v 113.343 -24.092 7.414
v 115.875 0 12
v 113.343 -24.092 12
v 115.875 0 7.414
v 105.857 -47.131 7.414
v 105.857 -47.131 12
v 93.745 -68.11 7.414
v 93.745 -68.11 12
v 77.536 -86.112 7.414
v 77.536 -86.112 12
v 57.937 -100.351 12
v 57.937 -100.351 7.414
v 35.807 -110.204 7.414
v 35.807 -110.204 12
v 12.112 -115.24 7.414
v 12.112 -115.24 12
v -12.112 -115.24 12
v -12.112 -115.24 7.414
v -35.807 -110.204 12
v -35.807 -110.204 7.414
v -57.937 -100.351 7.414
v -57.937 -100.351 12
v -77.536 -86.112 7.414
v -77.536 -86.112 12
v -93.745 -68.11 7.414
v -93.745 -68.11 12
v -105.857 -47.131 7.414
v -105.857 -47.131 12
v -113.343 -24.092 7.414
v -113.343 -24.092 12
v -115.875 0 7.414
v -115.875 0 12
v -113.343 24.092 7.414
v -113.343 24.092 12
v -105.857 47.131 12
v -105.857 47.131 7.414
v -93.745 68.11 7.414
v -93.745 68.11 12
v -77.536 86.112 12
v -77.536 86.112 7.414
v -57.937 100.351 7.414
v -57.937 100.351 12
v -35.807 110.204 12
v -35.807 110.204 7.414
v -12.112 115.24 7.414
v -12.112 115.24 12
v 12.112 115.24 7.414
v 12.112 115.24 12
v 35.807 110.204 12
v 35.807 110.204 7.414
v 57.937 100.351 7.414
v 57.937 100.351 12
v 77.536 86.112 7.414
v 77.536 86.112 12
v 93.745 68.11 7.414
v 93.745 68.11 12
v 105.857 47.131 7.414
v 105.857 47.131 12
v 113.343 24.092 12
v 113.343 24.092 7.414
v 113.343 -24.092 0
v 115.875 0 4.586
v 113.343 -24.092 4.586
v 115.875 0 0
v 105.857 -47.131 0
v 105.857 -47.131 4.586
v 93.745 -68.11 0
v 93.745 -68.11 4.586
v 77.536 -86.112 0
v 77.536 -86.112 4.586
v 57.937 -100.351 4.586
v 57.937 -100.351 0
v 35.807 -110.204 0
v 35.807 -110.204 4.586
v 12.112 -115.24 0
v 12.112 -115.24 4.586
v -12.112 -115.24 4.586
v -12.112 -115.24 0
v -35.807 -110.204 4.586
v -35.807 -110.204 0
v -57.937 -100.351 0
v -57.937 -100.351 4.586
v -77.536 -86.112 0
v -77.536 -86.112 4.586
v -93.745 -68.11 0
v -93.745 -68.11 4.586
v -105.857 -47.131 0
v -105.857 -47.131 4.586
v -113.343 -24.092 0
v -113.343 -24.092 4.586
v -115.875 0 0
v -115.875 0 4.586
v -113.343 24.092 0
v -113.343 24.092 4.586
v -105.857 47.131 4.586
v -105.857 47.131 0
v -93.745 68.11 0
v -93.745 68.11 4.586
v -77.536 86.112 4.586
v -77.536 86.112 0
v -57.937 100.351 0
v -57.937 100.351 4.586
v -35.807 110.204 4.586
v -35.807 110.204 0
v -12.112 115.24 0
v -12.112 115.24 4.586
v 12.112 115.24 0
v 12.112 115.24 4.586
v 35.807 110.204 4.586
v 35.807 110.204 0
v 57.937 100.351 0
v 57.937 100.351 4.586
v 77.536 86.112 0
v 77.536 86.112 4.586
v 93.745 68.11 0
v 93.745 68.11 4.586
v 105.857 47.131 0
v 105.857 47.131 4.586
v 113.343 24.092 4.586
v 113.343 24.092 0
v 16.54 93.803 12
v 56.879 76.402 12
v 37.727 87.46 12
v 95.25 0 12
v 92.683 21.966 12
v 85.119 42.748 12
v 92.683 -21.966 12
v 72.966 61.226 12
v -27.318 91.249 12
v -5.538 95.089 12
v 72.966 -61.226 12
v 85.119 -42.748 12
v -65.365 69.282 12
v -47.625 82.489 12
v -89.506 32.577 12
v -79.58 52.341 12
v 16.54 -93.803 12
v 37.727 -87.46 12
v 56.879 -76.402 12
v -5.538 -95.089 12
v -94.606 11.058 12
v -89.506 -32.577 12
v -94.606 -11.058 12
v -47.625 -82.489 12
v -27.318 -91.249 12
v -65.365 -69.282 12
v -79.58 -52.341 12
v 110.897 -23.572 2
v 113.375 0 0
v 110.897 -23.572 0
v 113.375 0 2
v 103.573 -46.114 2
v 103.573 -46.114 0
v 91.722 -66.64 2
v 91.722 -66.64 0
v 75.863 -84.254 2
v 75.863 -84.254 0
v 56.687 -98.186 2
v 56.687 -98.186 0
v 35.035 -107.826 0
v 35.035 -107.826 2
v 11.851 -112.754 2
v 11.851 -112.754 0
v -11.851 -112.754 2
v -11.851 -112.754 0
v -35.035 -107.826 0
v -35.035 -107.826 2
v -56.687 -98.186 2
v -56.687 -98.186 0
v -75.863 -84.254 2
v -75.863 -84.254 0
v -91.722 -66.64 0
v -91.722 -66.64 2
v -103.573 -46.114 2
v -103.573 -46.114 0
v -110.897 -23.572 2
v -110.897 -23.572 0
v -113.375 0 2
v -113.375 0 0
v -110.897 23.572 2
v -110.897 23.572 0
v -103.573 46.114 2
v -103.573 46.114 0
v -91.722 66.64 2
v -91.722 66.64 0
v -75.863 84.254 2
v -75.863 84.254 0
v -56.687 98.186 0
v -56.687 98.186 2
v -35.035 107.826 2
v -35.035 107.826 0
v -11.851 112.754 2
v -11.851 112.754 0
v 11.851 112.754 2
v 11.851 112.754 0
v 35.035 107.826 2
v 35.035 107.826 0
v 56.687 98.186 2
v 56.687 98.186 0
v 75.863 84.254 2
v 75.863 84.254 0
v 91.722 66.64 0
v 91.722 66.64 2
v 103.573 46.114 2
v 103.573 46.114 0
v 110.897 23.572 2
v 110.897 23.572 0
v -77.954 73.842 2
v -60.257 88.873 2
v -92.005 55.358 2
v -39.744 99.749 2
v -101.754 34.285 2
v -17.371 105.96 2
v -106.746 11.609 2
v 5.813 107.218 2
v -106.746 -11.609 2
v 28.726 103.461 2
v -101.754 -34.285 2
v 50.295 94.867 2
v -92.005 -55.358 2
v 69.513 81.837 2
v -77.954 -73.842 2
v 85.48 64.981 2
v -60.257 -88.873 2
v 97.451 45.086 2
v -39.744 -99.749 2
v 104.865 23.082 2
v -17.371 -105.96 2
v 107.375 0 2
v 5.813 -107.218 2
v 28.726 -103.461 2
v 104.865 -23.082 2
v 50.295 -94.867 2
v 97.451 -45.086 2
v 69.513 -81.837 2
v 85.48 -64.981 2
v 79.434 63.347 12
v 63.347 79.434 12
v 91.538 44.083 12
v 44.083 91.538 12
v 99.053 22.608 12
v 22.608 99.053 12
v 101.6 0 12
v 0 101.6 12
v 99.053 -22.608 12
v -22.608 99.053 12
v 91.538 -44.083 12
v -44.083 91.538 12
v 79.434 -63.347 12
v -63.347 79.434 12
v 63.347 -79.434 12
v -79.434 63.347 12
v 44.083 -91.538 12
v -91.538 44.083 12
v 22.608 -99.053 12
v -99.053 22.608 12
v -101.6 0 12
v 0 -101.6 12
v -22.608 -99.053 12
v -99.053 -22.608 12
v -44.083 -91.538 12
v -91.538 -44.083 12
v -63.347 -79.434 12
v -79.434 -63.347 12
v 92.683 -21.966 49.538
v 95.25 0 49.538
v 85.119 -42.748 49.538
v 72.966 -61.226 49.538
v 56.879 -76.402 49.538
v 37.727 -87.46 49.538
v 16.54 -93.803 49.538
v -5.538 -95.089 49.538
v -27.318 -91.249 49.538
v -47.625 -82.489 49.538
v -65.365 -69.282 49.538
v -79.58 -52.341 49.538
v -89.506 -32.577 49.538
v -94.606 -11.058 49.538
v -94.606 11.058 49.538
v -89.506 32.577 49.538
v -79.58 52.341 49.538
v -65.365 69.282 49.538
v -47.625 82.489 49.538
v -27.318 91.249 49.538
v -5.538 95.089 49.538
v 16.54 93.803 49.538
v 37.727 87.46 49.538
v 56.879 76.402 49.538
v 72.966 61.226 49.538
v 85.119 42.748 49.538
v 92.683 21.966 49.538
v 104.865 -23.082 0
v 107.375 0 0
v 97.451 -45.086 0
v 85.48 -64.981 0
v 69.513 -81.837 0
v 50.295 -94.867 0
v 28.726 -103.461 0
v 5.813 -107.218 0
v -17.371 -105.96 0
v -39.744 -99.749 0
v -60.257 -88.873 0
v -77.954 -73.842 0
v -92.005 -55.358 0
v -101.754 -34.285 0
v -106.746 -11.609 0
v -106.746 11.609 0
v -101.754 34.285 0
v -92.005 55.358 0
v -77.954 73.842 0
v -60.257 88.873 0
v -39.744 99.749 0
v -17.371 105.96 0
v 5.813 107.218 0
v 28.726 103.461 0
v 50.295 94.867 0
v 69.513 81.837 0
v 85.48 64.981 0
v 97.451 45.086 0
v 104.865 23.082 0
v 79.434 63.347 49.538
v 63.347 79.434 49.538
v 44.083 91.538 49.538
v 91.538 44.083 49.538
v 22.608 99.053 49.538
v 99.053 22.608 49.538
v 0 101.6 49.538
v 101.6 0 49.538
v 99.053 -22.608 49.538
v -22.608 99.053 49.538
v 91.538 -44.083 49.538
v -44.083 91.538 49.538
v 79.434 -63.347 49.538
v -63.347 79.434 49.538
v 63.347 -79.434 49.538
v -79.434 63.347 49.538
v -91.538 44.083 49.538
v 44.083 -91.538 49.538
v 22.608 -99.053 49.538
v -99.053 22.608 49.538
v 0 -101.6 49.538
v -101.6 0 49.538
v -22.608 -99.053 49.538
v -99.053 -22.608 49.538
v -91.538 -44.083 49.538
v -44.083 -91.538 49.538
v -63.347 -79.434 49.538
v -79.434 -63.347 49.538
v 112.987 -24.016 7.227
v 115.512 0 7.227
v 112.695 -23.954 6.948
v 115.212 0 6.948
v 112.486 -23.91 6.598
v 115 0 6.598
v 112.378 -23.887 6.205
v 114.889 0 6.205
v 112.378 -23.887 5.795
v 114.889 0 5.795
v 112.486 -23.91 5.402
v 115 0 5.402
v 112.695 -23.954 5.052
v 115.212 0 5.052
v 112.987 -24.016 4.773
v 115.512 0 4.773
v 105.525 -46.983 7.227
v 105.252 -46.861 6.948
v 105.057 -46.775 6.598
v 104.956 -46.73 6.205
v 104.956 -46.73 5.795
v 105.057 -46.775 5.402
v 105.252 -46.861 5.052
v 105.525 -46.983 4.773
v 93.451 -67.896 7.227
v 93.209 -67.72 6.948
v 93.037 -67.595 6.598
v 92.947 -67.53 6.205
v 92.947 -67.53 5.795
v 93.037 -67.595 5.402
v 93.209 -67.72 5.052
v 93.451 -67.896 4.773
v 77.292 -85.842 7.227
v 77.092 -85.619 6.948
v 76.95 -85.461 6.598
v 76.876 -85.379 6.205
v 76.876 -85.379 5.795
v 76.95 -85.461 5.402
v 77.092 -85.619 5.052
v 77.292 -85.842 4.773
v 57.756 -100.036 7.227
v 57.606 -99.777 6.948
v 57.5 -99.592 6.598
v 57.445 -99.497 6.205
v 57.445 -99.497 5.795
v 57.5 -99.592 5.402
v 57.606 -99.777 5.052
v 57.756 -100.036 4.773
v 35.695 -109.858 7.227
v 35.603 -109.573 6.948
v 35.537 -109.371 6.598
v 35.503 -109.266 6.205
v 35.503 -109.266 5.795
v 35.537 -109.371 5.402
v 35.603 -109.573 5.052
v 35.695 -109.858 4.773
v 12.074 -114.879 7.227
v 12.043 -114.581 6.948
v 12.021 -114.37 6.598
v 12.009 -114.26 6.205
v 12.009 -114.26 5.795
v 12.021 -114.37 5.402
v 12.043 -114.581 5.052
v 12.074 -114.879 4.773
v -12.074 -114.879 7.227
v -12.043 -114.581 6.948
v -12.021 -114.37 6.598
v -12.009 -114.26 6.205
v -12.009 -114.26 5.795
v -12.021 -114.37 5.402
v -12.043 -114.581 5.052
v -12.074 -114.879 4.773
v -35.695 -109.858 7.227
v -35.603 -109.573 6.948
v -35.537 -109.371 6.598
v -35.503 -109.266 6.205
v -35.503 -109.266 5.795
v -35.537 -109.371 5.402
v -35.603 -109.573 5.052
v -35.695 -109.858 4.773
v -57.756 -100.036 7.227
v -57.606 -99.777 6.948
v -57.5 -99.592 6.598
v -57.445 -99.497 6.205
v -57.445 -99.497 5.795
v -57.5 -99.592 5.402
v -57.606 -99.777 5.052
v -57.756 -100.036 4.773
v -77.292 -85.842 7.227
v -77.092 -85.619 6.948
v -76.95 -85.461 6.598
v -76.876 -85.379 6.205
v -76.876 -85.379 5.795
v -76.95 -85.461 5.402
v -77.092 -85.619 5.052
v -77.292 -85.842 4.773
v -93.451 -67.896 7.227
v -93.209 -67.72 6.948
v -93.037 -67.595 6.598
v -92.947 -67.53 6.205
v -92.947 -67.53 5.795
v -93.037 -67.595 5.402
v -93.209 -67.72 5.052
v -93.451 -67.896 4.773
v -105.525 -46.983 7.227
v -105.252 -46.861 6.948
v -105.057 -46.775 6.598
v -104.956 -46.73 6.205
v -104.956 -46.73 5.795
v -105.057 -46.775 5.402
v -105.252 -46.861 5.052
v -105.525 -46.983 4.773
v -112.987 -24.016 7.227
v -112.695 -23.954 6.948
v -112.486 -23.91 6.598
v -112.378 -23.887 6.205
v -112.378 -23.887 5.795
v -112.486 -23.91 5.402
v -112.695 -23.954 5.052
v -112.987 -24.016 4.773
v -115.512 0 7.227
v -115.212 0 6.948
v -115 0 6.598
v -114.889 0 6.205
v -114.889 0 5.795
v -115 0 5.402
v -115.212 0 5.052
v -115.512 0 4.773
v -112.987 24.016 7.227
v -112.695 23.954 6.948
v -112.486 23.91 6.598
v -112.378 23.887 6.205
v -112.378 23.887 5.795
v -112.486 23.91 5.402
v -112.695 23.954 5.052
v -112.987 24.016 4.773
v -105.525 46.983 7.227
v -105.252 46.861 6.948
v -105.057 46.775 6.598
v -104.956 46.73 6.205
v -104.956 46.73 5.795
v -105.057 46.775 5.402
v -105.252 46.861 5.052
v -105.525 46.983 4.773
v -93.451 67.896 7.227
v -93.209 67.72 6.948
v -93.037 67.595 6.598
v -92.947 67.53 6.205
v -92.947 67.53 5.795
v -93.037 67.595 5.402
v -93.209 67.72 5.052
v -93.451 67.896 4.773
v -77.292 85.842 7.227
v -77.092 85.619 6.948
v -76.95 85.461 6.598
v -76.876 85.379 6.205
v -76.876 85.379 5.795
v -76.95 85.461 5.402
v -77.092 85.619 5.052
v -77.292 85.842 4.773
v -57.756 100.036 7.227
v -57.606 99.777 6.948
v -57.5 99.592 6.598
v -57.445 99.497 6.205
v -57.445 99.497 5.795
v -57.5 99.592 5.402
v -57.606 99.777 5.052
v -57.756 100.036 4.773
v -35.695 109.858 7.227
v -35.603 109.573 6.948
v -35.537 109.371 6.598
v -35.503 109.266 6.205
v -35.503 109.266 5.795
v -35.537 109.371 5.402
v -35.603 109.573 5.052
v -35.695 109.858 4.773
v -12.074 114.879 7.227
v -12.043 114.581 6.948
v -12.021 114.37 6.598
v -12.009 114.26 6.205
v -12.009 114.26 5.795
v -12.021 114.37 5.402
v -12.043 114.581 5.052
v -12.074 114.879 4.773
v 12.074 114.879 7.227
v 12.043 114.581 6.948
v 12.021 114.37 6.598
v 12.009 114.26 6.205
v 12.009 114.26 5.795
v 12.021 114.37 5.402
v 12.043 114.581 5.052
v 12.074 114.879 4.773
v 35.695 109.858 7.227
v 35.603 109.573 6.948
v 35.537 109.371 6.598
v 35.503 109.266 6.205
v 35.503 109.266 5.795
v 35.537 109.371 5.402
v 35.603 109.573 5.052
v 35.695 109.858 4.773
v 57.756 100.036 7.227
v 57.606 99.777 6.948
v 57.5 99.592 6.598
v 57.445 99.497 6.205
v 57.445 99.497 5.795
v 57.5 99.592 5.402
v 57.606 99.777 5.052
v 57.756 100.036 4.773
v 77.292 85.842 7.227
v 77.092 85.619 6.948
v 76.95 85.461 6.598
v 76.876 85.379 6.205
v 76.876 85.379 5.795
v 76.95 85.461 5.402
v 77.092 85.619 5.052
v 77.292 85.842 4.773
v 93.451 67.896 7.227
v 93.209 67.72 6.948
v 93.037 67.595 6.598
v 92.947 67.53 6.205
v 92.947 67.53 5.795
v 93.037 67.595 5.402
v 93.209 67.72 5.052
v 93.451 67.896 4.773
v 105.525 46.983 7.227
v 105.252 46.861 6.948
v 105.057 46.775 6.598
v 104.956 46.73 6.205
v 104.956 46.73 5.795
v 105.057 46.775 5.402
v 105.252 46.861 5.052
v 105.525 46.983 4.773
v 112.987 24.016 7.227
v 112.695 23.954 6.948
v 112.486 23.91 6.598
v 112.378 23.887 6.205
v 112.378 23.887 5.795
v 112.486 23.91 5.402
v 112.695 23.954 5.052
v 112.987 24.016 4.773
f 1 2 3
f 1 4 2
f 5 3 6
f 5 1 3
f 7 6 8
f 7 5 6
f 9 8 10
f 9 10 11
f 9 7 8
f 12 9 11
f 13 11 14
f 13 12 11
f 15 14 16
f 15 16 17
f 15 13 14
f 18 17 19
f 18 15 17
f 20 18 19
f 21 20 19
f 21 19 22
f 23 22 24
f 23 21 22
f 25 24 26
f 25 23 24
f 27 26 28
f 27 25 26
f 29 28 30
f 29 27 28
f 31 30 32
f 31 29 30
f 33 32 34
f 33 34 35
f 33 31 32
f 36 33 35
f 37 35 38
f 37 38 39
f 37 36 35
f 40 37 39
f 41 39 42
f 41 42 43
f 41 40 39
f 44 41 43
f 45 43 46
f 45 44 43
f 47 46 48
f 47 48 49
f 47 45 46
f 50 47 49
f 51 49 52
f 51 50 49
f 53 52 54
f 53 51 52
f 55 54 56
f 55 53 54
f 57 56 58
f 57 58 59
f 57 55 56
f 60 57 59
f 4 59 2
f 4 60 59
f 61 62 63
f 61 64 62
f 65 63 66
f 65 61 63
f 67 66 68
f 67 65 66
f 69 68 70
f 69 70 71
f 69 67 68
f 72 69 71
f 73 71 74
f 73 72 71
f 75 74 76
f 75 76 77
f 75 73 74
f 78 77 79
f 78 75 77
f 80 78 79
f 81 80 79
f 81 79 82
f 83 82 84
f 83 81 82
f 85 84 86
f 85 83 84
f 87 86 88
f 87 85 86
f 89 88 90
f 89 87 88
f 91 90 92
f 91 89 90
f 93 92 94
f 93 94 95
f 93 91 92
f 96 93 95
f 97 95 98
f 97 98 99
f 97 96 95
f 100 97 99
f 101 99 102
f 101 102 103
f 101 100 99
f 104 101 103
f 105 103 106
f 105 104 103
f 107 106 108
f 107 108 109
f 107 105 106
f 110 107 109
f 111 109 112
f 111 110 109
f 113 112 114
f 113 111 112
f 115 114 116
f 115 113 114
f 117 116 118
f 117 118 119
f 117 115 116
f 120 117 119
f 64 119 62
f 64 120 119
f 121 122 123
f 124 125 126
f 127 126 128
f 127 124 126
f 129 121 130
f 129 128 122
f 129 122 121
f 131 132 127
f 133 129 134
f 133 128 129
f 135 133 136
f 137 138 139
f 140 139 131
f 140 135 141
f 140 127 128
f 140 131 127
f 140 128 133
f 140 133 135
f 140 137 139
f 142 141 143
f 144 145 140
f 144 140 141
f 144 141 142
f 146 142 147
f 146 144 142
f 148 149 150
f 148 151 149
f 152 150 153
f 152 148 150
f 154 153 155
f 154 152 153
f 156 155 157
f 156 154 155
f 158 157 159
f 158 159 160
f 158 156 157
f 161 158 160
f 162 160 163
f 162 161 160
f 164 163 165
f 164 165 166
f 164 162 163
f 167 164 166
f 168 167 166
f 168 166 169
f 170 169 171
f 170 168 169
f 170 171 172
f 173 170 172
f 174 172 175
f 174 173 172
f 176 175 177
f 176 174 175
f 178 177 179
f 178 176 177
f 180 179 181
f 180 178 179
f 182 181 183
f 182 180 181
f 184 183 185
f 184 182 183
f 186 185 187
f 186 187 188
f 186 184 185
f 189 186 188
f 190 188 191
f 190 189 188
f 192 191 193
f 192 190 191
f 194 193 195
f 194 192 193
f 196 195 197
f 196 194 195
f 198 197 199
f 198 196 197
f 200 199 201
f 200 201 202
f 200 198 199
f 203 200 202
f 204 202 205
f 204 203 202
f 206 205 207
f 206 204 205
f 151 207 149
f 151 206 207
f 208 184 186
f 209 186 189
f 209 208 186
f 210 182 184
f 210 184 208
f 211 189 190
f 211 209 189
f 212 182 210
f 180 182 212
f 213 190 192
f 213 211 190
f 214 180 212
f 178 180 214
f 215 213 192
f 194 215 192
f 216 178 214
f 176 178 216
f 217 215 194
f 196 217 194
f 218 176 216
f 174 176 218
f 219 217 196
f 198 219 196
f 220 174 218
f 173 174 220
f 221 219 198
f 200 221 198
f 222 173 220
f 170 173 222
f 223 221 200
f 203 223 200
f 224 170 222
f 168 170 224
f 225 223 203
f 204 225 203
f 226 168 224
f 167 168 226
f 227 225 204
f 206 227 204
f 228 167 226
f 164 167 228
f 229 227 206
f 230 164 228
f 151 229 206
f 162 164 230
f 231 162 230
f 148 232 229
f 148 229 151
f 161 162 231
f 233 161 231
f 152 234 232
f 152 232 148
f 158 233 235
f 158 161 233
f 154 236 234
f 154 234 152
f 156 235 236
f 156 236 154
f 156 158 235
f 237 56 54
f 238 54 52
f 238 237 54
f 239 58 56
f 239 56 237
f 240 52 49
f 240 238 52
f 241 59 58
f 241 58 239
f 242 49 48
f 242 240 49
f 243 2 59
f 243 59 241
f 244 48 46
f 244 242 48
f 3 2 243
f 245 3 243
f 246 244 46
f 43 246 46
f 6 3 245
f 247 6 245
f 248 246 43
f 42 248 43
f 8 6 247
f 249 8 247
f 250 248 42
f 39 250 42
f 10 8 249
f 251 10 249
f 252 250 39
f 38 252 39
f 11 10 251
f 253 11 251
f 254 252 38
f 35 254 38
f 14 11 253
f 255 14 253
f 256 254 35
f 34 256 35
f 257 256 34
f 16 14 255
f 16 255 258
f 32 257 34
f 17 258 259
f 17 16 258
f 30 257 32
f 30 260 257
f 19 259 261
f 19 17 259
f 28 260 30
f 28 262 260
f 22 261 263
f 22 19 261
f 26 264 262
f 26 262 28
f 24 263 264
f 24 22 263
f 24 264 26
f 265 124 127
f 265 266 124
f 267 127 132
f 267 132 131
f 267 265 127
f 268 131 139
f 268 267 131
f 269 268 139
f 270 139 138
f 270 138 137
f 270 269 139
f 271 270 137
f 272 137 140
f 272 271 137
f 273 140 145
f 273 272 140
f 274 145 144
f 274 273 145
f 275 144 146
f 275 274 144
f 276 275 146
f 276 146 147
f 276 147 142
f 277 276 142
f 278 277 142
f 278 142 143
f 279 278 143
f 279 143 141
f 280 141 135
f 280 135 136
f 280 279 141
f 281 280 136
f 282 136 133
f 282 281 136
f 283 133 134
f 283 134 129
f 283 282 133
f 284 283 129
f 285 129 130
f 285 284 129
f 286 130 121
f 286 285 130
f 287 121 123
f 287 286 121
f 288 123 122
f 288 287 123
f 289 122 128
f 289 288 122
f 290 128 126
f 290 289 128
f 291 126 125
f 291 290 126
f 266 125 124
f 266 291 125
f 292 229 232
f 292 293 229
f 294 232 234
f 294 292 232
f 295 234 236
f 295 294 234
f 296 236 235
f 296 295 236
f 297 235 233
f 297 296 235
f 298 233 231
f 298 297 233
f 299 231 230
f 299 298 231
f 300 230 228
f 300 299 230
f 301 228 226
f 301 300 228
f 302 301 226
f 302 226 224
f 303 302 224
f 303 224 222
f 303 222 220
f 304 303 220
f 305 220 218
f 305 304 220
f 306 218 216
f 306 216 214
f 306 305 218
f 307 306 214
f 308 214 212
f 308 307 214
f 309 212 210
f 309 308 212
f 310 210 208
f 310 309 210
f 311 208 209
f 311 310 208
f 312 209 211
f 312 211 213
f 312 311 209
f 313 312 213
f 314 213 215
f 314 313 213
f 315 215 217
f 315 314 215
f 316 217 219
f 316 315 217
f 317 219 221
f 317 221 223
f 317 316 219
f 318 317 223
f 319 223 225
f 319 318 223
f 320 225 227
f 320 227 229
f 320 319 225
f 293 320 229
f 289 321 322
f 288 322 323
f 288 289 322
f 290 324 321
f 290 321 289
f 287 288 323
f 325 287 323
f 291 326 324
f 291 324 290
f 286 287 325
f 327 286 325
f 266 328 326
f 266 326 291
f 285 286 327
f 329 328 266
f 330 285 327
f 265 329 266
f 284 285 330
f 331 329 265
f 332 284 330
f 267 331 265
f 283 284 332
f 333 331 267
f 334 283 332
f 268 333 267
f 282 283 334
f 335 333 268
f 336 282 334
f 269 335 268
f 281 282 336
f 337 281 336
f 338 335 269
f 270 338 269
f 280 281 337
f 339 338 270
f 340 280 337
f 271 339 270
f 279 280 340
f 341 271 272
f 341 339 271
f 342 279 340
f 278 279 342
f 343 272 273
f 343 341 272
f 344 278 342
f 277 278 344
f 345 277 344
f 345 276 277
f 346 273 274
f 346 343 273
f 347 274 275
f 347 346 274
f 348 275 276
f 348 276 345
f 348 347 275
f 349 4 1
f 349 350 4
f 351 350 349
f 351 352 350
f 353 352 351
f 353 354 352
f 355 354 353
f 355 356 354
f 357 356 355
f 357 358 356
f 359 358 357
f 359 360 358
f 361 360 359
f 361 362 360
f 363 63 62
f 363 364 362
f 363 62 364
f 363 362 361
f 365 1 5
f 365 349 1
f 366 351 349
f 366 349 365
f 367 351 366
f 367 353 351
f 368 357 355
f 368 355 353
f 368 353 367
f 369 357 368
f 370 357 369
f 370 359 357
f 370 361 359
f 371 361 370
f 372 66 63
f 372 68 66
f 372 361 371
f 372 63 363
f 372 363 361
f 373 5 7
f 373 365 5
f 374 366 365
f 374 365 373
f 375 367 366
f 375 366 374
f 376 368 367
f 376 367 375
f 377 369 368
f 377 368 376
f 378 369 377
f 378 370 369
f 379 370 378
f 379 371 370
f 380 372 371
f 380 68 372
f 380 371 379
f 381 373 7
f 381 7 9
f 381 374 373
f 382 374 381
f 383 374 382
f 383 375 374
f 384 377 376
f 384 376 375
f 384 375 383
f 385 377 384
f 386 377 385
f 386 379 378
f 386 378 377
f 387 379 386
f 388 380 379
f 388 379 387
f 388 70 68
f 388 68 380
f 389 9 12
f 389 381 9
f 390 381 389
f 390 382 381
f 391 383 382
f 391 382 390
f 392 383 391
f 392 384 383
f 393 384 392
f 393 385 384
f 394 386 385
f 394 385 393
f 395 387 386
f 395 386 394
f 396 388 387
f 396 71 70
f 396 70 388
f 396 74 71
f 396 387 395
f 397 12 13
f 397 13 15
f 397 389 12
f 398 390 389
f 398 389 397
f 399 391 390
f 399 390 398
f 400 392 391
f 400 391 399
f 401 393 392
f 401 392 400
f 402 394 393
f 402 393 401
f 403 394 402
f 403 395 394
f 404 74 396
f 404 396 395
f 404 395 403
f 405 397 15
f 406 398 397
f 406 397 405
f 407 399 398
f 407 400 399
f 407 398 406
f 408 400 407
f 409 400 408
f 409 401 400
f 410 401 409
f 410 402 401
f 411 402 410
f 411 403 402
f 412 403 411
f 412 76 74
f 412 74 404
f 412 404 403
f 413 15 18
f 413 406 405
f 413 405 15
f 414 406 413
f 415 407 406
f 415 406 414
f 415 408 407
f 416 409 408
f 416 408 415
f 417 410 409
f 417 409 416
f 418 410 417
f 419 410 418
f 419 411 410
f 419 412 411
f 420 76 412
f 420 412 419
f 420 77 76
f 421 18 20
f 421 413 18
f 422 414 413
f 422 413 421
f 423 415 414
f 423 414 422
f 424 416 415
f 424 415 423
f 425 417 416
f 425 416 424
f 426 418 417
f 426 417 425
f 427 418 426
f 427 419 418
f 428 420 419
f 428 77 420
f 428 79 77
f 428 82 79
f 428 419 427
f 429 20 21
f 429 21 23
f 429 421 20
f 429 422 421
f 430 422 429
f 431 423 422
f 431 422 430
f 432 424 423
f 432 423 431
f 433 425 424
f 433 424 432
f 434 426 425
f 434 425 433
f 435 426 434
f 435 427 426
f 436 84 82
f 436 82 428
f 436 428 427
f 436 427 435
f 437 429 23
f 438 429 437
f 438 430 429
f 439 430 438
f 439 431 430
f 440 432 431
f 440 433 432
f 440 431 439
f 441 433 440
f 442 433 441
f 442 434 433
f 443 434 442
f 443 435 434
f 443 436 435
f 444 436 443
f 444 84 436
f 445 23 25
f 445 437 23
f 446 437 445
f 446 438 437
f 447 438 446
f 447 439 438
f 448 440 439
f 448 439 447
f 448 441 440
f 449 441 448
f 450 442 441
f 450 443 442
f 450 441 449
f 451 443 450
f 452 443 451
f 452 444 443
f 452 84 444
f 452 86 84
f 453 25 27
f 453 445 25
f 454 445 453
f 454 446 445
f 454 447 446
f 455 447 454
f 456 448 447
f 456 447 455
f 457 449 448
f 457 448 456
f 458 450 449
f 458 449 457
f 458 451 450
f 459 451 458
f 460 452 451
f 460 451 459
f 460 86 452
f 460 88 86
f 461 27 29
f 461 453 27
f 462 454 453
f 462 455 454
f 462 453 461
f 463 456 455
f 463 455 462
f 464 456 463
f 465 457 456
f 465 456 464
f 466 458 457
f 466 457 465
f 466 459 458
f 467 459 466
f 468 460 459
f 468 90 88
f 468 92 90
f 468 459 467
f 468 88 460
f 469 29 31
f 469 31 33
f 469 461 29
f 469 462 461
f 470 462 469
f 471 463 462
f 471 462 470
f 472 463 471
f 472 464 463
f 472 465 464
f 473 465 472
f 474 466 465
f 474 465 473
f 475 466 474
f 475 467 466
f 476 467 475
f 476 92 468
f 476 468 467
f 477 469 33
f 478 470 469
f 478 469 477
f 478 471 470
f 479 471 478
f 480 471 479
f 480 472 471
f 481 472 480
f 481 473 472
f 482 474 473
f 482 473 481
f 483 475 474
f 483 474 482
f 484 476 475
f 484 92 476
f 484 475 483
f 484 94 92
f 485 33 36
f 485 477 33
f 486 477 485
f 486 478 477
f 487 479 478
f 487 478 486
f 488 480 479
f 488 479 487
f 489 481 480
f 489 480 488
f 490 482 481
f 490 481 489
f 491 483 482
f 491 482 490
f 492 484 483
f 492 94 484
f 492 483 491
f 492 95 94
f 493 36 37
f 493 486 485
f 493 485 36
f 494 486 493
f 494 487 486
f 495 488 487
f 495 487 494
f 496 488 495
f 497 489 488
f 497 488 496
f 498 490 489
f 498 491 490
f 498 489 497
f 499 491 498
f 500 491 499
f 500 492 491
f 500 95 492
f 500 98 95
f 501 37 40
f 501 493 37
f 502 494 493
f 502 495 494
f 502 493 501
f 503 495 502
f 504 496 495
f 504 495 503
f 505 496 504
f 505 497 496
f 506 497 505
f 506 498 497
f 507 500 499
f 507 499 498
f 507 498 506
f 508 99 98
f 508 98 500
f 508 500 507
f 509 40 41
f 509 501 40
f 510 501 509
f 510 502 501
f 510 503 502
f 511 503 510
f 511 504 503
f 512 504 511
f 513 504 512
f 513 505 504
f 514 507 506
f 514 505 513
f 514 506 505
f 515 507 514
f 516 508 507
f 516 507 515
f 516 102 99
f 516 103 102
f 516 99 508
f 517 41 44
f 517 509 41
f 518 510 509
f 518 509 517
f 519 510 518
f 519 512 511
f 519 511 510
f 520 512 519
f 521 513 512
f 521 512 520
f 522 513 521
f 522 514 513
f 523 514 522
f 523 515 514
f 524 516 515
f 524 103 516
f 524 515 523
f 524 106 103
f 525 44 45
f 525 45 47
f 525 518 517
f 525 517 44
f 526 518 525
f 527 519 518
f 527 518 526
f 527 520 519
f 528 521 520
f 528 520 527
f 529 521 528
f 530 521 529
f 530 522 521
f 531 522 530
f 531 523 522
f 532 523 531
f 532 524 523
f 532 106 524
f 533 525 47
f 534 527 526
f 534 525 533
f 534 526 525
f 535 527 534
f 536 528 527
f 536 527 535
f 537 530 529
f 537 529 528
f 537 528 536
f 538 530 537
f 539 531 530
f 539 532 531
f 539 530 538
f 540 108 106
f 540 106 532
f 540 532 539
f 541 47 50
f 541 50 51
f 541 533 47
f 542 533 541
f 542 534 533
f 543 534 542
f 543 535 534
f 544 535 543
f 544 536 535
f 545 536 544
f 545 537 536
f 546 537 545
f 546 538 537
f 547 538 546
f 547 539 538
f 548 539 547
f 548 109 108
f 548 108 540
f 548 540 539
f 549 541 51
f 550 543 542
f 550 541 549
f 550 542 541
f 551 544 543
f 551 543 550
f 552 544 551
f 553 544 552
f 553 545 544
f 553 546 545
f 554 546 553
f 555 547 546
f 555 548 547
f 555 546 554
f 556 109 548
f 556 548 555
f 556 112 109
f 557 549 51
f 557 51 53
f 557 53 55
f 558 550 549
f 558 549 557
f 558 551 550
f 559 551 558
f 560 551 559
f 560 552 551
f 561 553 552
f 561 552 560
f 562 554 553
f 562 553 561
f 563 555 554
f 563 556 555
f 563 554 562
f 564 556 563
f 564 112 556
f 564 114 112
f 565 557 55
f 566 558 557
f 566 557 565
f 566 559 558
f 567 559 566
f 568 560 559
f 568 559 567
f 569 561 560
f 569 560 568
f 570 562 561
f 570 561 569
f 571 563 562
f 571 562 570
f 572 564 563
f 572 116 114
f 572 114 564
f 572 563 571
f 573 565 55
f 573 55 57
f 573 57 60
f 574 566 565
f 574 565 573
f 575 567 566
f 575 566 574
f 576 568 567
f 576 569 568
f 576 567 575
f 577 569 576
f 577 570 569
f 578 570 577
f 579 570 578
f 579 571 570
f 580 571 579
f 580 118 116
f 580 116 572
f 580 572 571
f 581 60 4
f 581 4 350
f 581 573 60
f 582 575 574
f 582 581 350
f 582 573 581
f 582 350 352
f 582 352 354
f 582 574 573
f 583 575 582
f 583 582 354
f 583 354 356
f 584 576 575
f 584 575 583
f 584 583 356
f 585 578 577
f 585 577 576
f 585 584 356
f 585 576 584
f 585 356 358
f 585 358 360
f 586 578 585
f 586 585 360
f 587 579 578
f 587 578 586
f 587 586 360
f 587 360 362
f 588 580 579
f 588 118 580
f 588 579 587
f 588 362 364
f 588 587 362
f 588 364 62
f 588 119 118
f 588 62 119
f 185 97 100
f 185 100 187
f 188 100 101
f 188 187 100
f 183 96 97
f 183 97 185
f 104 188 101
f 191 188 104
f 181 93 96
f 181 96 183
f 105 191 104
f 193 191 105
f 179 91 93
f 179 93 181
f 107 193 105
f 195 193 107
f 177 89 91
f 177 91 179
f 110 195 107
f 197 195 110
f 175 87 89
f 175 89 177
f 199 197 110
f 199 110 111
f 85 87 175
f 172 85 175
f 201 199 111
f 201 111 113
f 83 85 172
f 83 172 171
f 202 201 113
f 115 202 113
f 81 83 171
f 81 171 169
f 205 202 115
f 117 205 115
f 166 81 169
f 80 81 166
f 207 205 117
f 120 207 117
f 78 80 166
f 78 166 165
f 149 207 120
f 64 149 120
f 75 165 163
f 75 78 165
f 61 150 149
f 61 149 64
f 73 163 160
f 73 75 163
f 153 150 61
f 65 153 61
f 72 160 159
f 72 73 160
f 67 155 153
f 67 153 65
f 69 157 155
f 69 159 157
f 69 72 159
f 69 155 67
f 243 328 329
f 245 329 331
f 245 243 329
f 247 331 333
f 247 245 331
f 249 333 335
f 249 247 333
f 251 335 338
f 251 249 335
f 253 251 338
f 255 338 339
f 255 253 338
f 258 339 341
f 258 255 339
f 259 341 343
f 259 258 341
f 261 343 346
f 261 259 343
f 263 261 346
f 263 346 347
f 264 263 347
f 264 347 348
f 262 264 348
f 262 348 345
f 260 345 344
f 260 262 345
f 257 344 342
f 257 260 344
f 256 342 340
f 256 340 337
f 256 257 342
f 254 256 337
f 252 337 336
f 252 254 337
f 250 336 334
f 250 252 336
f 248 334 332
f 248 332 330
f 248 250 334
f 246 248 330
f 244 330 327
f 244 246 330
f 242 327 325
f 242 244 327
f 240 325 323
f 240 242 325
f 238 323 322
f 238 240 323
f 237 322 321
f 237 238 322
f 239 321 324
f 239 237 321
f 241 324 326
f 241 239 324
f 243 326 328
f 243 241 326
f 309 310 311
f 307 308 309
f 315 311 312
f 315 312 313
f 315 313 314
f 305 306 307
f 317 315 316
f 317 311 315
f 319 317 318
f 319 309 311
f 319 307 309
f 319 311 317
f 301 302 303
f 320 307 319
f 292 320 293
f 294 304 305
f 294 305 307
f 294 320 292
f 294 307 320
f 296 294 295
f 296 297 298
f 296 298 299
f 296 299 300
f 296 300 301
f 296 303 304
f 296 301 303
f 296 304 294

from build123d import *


with BuildPart() as part:
    # Sketch1 → Base-Revolve (revolve)
    with BuildSketch(Plane(origin=(0, 0, 0), x_dir=(0, 0, -1), z_dir=(1, 0, 0))):
        with BuildLine():
            Line((-4.585786438, 115.874999992), (0, 115.874999992))
            Line((0, 115.874999992), (0, 113.374999974))
            Line((0, 113.374999974), (-2, 113.374999974))
            Line((-2, 113.374999974), (-2, 107.374999974))
            Line((-2, 107.374999974), (0, 107.374999974))
            Line((0, 107.374999974), (0, 0))
            Line((0, 0), (-12, 0))
            Line((-12, 0), (-12, 95.25))
            Line((-12, 95.25), (-49.538490201, 95.25))
            Line((-49.538490201, 95.25), (-49.538490201, 101.6))
            Line((-49.538490201, 101.6), (-12, 101.6))
            Line((-12, 101.6), (-12, 115.874999992))
            Line((-12, 115.874999992), (-7.414213562, 115.874999992))
            ThreePointArc((-7.414213562, 115.874999992), (-6, 114.874999992), (-4.585786438, 115.874999992))
        make_face()
    revolve(axis=Axis((0, 0, 12), (0, 0, -1)))


solid = part.part
